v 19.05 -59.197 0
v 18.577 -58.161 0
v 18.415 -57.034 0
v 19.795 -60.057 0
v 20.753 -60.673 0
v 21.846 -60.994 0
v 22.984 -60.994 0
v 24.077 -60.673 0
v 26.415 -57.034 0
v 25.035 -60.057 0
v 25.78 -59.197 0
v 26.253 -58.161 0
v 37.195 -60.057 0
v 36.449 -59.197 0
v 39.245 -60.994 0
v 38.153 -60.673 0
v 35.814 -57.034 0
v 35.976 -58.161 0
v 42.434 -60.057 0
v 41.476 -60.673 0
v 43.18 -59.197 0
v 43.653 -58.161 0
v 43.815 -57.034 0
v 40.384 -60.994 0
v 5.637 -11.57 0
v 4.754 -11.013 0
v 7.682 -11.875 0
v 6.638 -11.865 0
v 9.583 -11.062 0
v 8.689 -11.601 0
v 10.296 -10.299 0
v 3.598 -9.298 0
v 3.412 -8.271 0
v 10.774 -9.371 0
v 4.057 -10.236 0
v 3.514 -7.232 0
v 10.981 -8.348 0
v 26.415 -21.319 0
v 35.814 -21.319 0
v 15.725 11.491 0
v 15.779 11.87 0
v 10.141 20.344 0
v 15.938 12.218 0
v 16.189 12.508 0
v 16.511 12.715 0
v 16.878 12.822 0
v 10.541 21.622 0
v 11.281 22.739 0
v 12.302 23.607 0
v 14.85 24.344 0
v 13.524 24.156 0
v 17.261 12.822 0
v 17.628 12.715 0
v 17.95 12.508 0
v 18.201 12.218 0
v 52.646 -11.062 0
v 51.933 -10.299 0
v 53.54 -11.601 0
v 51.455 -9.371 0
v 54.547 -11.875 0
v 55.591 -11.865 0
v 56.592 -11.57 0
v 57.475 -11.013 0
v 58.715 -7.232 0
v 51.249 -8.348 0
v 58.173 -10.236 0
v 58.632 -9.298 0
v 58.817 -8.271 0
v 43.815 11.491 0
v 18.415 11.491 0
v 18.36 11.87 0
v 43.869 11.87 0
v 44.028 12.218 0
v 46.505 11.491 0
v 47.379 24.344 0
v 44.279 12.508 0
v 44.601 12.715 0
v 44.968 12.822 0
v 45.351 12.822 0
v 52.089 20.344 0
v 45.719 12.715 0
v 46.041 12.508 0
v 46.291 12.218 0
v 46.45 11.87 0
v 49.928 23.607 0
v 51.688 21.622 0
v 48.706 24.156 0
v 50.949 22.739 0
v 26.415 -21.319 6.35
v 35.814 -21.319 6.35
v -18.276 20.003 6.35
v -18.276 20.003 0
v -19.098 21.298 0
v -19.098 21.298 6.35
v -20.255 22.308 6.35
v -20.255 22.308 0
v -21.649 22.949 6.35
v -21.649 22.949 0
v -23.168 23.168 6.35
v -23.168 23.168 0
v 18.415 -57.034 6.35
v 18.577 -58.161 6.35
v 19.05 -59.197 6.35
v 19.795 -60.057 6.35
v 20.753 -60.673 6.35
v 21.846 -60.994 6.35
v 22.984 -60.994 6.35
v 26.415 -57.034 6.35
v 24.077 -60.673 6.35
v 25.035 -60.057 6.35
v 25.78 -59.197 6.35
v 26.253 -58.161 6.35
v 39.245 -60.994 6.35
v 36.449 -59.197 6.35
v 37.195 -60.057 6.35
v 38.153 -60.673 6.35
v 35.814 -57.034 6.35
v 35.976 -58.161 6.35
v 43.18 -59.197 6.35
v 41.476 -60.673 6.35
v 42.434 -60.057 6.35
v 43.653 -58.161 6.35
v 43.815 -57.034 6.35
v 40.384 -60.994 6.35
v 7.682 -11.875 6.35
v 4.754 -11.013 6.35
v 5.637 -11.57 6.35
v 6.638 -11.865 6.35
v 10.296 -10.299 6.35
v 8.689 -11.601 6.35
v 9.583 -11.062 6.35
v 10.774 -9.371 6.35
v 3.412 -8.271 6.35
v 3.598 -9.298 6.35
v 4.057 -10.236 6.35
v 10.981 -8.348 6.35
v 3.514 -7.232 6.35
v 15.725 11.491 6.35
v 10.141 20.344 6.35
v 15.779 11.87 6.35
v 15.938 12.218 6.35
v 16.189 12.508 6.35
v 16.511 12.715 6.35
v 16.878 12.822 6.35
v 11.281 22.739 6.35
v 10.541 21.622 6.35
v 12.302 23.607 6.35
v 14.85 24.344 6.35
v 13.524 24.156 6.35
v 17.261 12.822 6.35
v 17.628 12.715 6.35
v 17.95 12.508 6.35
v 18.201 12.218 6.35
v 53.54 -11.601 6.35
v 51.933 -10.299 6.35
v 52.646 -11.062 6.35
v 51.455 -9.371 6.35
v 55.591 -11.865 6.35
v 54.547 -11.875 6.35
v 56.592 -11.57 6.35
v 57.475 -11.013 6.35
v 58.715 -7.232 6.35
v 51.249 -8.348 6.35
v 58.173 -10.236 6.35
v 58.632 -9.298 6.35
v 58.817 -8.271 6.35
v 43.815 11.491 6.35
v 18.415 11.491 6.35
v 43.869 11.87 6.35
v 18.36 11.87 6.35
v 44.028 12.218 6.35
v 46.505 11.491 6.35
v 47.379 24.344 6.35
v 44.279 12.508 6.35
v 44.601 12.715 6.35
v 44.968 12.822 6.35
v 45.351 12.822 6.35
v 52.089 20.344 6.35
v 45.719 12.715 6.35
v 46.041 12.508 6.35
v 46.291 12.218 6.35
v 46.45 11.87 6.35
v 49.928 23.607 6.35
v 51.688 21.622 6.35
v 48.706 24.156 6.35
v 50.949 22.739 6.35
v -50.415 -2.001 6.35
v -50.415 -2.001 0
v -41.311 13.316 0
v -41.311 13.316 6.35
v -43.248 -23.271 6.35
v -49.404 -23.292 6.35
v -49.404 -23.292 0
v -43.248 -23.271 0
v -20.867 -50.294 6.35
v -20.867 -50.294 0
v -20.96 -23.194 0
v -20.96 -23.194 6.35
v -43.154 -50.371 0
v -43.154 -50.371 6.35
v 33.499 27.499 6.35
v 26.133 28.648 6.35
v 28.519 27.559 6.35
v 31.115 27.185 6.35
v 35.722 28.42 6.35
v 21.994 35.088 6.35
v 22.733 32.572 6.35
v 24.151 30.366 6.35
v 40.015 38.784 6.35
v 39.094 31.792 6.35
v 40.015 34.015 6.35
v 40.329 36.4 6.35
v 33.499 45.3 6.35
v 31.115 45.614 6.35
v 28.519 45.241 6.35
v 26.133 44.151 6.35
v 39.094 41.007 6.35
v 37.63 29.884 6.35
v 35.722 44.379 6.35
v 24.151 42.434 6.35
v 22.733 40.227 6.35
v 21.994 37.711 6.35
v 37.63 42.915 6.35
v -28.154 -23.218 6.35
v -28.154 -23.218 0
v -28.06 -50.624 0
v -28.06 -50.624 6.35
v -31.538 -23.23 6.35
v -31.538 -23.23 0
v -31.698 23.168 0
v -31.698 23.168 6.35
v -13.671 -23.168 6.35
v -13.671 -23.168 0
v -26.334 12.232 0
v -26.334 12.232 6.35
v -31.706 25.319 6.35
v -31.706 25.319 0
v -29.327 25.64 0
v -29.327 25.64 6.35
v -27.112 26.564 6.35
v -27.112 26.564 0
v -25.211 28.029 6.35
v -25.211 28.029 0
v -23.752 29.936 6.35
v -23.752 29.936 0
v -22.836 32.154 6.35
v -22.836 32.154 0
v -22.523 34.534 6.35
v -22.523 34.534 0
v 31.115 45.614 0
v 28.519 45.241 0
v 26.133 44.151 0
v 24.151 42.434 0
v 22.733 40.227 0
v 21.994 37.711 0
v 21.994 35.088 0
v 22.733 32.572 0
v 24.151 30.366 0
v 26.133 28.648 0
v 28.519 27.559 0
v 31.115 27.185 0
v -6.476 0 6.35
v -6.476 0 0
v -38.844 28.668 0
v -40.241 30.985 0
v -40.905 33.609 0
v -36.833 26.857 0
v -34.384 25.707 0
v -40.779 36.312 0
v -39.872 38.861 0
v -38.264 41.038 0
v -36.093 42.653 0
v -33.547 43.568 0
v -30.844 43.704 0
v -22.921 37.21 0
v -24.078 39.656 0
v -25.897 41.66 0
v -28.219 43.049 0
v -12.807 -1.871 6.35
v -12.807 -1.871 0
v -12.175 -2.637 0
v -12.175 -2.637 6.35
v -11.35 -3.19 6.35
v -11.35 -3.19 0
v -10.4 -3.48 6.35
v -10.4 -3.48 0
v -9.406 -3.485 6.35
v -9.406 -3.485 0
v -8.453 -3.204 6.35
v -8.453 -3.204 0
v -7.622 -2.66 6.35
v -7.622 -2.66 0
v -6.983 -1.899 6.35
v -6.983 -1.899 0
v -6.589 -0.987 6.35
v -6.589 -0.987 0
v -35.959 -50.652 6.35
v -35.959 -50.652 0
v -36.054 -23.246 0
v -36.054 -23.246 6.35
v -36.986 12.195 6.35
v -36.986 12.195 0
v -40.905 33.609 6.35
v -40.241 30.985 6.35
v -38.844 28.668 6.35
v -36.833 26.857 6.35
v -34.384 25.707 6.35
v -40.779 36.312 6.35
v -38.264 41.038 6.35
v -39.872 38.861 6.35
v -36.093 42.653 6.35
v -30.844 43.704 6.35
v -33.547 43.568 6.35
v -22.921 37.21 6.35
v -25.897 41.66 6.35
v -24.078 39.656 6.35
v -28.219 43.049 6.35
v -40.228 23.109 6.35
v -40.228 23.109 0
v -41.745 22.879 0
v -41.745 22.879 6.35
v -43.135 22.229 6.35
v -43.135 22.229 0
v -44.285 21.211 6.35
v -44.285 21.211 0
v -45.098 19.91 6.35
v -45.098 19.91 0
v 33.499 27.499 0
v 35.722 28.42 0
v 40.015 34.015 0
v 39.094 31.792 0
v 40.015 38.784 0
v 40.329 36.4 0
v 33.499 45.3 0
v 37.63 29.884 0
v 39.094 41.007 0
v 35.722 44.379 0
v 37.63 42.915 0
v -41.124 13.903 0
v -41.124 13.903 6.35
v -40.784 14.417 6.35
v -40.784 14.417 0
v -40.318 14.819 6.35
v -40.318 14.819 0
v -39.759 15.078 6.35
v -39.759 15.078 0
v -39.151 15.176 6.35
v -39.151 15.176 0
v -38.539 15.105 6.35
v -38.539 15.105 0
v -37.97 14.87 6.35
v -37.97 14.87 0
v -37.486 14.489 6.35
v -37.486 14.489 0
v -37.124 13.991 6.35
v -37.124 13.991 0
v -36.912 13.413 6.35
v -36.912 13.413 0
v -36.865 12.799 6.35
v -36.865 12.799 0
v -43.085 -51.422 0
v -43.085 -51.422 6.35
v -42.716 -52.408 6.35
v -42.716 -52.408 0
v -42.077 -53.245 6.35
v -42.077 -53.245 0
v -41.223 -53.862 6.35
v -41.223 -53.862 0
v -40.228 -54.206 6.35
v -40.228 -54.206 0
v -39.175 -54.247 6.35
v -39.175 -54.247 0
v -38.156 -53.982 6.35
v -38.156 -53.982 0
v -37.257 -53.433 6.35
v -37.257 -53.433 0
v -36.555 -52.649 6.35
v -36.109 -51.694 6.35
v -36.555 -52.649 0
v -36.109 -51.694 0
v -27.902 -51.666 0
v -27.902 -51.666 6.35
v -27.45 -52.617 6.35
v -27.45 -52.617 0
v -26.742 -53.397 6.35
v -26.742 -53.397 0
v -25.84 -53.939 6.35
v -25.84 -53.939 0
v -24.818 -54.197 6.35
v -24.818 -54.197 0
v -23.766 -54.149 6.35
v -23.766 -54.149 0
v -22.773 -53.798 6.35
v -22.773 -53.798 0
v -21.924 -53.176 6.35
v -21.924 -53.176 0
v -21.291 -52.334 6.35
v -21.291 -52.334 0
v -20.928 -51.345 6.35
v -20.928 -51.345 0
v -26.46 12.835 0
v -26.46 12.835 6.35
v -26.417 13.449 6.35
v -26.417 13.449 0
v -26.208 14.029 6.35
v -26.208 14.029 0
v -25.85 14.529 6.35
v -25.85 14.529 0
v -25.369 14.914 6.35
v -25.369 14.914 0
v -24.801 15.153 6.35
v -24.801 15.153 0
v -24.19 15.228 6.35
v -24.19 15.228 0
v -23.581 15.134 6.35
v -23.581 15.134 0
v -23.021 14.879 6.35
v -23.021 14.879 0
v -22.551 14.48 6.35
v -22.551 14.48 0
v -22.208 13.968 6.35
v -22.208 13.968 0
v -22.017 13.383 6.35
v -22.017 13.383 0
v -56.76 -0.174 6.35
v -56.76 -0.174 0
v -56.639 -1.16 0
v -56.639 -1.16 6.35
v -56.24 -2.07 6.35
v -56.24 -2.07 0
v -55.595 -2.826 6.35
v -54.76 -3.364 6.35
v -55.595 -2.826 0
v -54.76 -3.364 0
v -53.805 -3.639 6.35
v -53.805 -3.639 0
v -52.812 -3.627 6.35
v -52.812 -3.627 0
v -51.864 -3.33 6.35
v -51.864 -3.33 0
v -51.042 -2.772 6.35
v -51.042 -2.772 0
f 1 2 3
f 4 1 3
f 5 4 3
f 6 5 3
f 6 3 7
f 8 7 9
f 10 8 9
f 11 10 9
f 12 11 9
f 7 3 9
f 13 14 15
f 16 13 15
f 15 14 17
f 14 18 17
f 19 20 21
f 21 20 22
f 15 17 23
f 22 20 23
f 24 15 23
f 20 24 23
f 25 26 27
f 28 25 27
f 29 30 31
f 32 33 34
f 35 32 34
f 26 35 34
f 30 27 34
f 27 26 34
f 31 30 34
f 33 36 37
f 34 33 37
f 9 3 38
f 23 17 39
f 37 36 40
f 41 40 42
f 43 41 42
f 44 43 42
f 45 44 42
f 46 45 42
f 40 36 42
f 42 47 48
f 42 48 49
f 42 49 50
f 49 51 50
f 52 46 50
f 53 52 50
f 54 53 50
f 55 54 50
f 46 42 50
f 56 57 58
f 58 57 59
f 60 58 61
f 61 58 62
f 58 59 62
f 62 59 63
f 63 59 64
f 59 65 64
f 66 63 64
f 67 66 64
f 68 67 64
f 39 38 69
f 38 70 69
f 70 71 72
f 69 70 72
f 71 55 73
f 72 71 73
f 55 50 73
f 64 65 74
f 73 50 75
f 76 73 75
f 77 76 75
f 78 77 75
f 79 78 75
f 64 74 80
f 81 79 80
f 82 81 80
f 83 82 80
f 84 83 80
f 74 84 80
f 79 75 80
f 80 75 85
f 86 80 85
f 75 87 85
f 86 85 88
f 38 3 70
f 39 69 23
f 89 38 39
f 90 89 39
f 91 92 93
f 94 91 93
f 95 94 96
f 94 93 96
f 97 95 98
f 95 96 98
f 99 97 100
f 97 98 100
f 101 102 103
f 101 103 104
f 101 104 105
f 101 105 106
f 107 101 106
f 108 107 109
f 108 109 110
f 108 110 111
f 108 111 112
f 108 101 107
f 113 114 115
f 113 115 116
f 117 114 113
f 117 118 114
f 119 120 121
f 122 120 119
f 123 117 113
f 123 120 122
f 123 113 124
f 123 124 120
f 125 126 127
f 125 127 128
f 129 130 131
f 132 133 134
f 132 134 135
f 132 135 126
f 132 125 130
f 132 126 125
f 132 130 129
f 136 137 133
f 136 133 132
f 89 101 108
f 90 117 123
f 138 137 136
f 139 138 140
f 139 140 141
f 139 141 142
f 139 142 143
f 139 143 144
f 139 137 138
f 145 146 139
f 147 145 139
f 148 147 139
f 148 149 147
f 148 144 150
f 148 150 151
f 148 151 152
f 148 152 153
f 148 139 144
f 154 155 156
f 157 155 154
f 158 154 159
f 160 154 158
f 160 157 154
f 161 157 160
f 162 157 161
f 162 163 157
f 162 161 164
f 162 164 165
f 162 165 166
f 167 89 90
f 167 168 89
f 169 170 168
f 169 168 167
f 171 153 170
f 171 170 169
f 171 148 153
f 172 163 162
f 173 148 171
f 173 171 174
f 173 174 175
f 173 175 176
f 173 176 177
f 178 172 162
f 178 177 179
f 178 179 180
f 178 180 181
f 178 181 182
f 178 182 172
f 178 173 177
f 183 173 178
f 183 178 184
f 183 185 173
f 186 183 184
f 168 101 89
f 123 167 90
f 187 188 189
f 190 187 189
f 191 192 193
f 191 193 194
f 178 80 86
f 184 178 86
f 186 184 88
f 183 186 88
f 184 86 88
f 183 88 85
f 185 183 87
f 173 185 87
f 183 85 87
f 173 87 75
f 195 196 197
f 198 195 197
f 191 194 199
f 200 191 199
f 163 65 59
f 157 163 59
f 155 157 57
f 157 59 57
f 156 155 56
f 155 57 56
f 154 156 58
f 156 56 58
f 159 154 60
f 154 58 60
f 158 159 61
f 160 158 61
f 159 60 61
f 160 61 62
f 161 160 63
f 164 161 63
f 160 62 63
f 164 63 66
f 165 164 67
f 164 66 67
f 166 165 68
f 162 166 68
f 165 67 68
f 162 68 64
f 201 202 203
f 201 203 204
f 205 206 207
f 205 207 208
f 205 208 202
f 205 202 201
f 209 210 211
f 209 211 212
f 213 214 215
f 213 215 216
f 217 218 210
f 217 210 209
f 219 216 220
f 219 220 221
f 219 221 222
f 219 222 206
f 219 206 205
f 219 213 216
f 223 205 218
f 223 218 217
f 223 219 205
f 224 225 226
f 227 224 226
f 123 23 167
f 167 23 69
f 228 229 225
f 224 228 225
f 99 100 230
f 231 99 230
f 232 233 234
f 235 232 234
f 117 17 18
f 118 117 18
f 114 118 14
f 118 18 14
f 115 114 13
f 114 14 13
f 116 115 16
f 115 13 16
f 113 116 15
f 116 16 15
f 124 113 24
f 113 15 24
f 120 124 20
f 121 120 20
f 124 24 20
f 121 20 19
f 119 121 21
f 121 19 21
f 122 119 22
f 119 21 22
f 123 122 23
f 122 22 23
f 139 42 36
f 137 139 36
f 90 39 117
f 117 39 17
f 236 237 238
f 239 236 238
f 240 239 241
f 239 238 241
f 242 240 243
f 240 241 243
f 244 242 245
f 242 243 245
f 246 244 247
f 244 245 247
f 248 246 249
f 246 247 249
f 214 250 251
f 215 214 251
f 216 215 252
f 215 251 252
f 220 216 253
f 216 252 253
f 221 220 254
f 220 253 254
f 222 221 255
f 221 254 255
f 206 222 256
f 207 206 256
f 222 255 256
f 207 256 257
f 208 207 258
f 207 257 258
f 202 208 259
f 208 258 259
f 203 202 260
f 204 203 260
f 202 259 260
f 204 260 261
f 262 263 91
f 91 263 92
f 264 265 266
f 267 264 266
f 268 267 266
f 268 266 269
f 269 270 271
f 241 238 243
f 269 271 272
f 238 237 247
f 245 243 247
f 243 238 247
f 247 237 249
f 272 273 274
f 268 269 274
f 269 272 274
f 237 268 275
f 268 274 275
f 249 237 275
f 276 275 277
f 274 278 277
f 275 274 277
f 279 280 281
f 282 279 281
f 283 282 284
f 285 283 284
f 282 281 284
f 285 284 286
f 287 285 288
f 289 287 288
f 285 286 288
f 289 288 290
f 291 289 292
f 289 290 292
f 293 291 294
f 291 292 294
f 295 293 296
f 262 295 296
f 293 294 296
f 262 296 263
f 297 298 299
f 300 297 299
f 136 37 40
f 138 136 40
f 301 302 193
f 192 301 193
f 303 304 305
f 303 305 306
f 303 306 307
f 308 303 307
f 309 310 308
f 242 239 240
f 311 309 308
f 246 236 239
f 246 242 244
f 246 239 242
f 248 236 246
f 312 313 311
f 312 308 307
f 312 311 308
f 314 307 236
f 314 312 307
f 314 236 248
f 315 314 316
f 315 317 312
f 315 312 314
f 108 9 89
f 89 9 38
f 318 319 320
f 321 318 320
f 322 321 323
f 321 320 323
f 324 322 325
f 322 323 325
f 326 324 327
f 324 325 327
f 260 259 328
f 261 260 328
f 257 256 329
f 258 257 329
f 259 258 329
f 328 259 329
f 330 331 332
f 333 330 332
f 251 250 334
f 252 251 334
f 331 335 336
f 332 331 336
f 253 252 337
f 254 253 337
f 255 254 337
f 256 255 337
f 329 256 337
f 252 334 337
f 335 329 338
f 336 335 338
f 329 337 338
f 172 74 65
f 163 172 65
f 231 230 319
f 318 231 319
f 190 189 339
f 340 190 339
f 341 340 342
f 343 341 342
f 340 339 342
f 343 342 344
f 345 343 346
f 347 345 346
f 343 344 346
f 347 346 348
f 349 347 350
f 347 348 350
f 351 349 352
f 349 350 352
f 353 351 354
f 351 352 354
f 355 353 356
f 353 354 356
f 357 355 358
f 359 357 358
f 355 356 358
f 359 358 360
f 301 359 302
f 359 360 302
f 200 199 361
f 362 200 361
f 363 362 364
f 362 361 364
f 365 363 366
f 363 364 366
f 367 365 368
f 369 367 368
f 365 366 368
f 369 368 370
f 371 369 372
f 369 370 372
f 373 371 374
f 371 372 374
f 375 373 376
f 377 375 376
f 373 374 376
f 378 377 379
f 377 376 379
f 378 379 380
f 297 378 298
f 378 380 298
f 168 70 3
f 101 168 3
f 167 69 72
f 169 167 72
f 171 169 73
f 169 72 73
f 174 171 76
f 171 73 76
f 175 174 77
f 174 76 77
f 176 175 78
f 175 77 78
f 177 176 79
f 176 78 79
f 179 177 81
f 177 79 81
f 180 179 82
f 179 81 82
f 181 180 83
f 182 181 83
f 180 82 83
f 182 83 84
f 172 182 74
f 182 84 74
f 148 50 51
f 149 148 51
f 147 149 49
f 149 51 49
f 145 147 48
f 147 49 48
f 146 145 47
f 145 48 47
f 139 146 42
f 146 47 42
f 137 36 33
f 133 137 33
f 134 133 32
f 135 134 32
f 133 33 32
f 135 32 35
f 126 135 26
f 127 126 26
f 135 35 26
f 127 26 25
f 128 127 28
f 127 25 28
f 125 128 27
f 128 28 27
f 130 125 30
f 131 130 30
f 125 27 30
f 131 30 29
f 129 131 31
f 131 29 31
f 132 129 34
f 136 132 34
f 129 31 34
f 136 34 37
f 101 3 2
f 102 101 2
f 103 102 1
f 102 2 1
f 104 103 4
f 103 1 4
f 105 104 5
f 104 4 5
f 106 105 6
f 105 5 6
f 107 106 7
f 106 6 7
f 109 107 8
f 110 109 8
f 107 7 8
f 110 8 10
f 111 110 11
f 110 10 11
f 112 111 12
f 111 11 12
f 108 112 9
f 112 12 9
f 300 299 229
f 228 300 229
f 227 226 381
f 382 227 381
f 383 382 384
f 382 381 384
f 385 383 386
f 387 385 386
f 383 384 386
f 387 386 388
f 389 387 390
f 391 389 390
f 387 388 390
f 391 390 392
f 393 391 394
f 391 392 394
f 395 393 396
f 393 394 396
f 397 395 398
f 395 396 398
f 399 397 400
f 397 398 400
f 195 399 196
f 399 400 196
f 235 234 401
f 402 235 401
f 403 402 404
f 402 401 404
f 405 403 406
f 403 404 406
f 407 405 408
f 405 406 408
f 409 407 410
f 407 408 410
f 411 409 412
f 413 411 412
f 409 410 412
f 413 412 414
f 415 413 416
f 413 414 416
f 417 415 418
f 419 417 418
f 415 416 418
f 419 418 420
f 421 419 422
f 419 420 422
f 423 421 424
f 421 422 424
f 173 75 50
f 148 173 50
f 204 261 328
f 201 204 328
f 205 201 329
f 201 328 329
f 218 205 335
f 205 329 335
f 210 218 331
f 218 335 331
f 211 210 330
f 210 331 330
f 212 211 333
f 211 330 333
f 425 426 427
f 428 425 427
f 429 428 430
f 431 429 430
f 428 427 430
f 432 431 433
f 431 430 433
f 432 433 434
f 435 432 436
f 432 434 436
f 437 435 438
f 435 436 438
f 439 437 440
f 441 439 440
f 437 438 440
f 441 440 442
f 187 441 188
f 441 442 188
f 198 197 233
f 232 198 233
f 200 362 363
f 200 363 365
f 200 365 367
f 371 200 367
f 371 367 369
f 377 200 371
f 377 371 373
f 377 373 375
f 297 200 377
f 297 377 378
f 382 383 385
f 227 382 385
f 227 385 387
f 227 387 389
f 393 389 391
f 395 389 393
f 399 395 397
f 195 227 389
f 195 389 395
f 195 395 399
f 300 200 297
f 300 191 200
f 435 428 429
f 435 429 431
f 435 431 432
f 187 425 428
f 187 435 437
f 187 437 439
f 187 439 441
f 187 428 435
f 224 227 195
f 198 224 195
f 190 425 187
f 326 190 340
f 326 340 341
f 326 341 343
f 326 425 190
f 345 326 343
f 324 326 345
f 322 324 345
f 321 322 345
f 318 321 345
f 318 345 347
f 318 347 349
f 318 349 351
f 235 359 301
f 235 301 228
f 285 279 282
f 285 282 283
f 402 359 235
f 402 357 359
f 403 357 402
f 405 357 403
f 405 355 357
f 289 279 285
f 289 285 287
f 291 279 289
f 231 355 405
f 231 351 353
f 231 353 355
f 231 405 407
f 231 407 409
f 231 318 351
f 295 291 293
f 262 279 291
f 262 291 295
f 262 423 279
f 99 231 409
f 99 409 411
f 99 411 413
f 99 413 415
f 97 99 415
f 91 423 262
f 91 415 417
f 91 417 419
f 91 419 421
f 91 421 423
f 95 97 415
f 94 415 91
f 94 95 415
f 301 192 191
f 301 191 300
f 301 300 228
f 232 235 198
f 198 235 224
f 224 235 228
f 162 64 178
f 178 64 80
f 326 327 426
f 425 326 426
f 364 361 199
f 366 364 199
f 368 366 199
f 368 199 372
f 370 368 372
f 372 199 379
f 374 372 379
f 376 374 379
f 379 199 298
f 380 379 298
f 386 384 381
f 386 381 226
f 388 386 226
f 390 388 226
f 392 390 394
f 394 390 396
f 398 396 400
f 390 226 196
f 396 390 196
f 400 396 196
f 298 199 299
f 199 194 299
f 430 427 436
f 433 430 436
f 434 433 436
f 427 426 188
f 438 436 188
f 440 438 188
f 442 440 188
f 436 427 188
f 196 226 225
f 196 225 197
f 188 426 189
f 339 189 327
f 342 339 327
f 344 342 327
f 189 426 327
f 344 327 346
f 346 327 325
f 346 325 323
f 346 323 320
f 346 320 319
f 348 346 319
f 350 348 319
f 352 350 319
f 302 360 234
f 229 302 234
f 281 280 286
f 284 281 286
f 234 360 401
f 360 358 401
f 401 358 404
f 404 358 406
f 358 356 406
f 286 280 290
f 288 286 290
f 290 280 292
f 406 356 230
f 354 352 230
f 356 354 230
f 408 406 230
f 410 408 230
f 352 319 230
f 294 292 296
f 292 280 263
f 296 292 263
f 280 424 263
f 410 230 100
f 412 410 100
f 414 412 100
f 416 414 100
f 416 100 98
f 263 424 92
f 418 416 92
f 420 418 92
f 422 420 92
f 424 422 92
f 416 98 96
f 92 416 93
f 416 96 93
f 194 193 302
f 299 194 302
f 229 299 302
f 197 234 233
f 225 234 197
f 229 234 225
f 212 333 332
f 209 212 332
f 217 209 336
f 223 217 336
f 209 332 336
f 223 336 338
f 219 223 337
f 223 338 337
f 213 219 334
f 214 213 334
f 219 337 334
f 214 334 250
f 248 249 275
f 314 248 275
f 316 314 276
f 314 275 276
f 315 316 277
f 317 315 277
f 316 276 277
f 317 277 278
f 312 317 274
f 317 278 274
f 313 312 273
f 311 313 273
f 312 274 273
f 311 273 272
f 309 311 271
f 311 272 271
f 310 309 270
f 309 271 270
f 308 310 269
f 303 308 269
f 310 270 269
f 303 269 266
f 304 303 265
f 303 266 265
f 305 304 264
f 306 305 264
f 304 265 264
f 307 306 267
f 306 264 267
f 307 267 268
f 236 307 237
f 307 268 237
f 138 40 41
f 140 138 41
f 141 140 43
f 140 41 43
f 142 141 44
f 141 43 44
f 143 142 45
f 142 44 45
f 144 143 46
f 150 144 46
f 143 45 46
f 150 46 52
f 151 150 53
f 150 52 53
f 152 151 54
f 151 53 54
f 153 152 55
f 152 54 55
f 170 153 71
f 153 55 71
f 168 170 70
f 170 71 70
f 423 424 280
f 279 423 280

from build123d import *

# Parameters (mm, degrees)
F2_DEPTH = 6.35
F3_DEPTH = 6.35


with BuildPart() as f2:
    # F1 (on Top) → F2 (new body)
    with BuildSketch(Plane.XY):
        with BuildLine():
            ThreePointArc((31.114665, 27.185343), (37.630146, 29.884144), (40.328947, 36.399625))
            ThreePointArc((40.328947, 36.399625), (37.630146, 42.915106), (31.114665, 45.613907))
            Line((31.114665, 45.613907), (31.114665, 27.185343))
        make_face()
        with BuildLine():
            Line((47.379028, 24.344243), (31.114665, 24.344243))
            Line((31.114665, 24.344243), (31.114665, -21.318654))
            Line((31.114665, -21.318654), (35.814174, -21.318654))
            Line((35.814174, -21.318654), (35.814174, -57.034191))
            ThreePointArc((35.814174, -57.034191), (39.814419, -61.034436), (43.814665, -57.034191))
            Line((43.814665, -57.034191), (43.814665, 11.491112))
            ThreePointArc((43.814665, 11.491112), (45.159738, 12.836185), (46.50481, 11.491112))
            Line((46.50481, 11.491112), (51.248619, -8.347725))
            ThreePointArc((51.248619, -8.347725), (55.59106, -11.864868), (58.715373, -7.231753))
            Line((58.715373, -7.231753), (52.08867, 20.343888))
            ThreePointArc((52.08867, 20.343888), (50.46867, 23.209175), (47.379028, 24.344243))
        make_face()
        with BuildLine():
            Line((31.114665, -21.318654), (31.114665, 24.344243))
            Line((31.114665, 24.344243), (14.850302, 24.344243))
            ThreePointArc((14.850302, 24.344243), (11.760659, 23.209175), (10.140659, 20.343888))
            Line((10.140659, 20.343888), (3.513956, -7.231753))
            ThreePointArc((3.513956, -7.231753), (6.638269, -11.864868), (10.98071, -8.347725))
            Line((10.98071, -8.347725), (15.724519, 11.491112))
            ThreePointArc((15.724519, 11.491112), (17.069592, 12.836185), (18.414665, 11.491112))
            Line((18.414665, 11.491112), (18.414665, -57.034191))
            ThreePointArc((18.414665, -57.034191), (22.41491, -61.034436), (26.415156, -57.034191))
            Line((26.415156, -57.034191), (26.415156, -21.318654))
            Line((26.415156, -21.318654), (31.114665, -21.318654))
        make_face()
        with BuildLine():
            Line((31.114665, 27.185343), (31.114665, 45.613907))
            ThreePointArc((31.114665, 45.613907), (21.900383, 36.399625), (31.114665, 27.185343))
        make_face()
    extrude(amount=F2_DEPTH)


with BuildPart() as f3:
    # F0 (on Top) → F3 (new body)
    with BuildSketch(Plane.XY):
        with BuildLine():
            ThreePointArc((-31.705567, 25.319321), (-25.210708, 28.029348), (-22.523171, 34.533545))
            ThreePointArc((-22.523171, 34.533545), (-38.264193, 41.037743), (-31.705567, 25.319321))
        make_face()
        with BuildLine():
            Line((-23.168363, 23.168363), (-31.698125, 23.168363))
            Line((-31.698125, 23.168363), (-31.537577, -23.230185))
            Line((-31.537577, -23.230185), (-28.154348, -23.218479))
            Line((-28.154348, -23.218479), (-20.960285, -23.193586))
            Line((-20.960285, -23.193586), (-13.670774, -23.168363))
            Line((-13.670774, -23.168363), (-26.334226, 12.231745))
            ThreePointArc((-26.334226, 12.231745), (-24.801129, 15.152778), (-22.01714, 13.382968))
            Line((-22.01714, 13.382968), (-12.807355, -1.870737))
            ThreePointArc((-12.807355, -1.870737), (-8.919371, -3.379471), (-6.475629, 0))
            Line((-6.475629, 0), (-18.275665, 20.002501))
            ThreePointArc((-18.275665, 20.002501), (-20.254552, 22.307873), (-23.168363, 23.168363))
        make_face()
        with BuildLine():
            Line((-31.537577, -23.230185), (-31.698125, 23.168363))
            Line((-31.698125, 23.168363), (-40.227683, 23.109334))
            ThreePointArc((-40.227683, 23.109334), (-43.135469, 22.228701), (-45.098354, 19.909689))
            Line((-45.098354, 19.909689), (-56.759685, -0.173993))
            ThreePointArc((-56.759685, -0.173993), (-54.292614, -3.536471), (-50.415164, -2.000868))
            Line((-50.415164, -2.000868), (-41.31116, 13.316207))
            ThreePointArc((-41.31116, 13.316207), (-38.539485, 15.105241), (-36.98621, 12.194887))
            Line((-36.98621, 12.194887), (-49.404379, -23.292008))
            Line((-49.404379, -23.292008), (-43.247845, -23.270705))
            Line((-43.247845, -23.270705), (-36.053782, -23.245812))
            Line((-36.053782, -23.245812), (-31.537577, -23.230185))
        make_face()
        with BuildLine():
            Line((-35.958952, -50.651649), (-36.053782, -23.245812))
            Line((-36.053782, -23.245812), (-43.247845, -23.270705))
            Line((-43.247845, -23.270705), (-43.154073, -50.370816))
            ThreePointArc((-43.154073, -50.370816), (-39.703023, -54.264926), (-35.958952, -50.651649))
        make_face()
        with BuildLine():
            Line((-20.960285, -23.193586), (-28.154348, -23.218479))
            Line((-28.154348, -23.218479), (-28.059519, -50.624316))
            ThreePointArc((-28.059519, -50.624316), (-24.290532, -54.211596), (-20.866514, -50.293696))
            Line((-20.866514, -50.293696), (-20.960285, -23.193586))
        make_face()
    extrude(amount=F3_DEPTH)


solid = Compound([f2.part, f3.part])
